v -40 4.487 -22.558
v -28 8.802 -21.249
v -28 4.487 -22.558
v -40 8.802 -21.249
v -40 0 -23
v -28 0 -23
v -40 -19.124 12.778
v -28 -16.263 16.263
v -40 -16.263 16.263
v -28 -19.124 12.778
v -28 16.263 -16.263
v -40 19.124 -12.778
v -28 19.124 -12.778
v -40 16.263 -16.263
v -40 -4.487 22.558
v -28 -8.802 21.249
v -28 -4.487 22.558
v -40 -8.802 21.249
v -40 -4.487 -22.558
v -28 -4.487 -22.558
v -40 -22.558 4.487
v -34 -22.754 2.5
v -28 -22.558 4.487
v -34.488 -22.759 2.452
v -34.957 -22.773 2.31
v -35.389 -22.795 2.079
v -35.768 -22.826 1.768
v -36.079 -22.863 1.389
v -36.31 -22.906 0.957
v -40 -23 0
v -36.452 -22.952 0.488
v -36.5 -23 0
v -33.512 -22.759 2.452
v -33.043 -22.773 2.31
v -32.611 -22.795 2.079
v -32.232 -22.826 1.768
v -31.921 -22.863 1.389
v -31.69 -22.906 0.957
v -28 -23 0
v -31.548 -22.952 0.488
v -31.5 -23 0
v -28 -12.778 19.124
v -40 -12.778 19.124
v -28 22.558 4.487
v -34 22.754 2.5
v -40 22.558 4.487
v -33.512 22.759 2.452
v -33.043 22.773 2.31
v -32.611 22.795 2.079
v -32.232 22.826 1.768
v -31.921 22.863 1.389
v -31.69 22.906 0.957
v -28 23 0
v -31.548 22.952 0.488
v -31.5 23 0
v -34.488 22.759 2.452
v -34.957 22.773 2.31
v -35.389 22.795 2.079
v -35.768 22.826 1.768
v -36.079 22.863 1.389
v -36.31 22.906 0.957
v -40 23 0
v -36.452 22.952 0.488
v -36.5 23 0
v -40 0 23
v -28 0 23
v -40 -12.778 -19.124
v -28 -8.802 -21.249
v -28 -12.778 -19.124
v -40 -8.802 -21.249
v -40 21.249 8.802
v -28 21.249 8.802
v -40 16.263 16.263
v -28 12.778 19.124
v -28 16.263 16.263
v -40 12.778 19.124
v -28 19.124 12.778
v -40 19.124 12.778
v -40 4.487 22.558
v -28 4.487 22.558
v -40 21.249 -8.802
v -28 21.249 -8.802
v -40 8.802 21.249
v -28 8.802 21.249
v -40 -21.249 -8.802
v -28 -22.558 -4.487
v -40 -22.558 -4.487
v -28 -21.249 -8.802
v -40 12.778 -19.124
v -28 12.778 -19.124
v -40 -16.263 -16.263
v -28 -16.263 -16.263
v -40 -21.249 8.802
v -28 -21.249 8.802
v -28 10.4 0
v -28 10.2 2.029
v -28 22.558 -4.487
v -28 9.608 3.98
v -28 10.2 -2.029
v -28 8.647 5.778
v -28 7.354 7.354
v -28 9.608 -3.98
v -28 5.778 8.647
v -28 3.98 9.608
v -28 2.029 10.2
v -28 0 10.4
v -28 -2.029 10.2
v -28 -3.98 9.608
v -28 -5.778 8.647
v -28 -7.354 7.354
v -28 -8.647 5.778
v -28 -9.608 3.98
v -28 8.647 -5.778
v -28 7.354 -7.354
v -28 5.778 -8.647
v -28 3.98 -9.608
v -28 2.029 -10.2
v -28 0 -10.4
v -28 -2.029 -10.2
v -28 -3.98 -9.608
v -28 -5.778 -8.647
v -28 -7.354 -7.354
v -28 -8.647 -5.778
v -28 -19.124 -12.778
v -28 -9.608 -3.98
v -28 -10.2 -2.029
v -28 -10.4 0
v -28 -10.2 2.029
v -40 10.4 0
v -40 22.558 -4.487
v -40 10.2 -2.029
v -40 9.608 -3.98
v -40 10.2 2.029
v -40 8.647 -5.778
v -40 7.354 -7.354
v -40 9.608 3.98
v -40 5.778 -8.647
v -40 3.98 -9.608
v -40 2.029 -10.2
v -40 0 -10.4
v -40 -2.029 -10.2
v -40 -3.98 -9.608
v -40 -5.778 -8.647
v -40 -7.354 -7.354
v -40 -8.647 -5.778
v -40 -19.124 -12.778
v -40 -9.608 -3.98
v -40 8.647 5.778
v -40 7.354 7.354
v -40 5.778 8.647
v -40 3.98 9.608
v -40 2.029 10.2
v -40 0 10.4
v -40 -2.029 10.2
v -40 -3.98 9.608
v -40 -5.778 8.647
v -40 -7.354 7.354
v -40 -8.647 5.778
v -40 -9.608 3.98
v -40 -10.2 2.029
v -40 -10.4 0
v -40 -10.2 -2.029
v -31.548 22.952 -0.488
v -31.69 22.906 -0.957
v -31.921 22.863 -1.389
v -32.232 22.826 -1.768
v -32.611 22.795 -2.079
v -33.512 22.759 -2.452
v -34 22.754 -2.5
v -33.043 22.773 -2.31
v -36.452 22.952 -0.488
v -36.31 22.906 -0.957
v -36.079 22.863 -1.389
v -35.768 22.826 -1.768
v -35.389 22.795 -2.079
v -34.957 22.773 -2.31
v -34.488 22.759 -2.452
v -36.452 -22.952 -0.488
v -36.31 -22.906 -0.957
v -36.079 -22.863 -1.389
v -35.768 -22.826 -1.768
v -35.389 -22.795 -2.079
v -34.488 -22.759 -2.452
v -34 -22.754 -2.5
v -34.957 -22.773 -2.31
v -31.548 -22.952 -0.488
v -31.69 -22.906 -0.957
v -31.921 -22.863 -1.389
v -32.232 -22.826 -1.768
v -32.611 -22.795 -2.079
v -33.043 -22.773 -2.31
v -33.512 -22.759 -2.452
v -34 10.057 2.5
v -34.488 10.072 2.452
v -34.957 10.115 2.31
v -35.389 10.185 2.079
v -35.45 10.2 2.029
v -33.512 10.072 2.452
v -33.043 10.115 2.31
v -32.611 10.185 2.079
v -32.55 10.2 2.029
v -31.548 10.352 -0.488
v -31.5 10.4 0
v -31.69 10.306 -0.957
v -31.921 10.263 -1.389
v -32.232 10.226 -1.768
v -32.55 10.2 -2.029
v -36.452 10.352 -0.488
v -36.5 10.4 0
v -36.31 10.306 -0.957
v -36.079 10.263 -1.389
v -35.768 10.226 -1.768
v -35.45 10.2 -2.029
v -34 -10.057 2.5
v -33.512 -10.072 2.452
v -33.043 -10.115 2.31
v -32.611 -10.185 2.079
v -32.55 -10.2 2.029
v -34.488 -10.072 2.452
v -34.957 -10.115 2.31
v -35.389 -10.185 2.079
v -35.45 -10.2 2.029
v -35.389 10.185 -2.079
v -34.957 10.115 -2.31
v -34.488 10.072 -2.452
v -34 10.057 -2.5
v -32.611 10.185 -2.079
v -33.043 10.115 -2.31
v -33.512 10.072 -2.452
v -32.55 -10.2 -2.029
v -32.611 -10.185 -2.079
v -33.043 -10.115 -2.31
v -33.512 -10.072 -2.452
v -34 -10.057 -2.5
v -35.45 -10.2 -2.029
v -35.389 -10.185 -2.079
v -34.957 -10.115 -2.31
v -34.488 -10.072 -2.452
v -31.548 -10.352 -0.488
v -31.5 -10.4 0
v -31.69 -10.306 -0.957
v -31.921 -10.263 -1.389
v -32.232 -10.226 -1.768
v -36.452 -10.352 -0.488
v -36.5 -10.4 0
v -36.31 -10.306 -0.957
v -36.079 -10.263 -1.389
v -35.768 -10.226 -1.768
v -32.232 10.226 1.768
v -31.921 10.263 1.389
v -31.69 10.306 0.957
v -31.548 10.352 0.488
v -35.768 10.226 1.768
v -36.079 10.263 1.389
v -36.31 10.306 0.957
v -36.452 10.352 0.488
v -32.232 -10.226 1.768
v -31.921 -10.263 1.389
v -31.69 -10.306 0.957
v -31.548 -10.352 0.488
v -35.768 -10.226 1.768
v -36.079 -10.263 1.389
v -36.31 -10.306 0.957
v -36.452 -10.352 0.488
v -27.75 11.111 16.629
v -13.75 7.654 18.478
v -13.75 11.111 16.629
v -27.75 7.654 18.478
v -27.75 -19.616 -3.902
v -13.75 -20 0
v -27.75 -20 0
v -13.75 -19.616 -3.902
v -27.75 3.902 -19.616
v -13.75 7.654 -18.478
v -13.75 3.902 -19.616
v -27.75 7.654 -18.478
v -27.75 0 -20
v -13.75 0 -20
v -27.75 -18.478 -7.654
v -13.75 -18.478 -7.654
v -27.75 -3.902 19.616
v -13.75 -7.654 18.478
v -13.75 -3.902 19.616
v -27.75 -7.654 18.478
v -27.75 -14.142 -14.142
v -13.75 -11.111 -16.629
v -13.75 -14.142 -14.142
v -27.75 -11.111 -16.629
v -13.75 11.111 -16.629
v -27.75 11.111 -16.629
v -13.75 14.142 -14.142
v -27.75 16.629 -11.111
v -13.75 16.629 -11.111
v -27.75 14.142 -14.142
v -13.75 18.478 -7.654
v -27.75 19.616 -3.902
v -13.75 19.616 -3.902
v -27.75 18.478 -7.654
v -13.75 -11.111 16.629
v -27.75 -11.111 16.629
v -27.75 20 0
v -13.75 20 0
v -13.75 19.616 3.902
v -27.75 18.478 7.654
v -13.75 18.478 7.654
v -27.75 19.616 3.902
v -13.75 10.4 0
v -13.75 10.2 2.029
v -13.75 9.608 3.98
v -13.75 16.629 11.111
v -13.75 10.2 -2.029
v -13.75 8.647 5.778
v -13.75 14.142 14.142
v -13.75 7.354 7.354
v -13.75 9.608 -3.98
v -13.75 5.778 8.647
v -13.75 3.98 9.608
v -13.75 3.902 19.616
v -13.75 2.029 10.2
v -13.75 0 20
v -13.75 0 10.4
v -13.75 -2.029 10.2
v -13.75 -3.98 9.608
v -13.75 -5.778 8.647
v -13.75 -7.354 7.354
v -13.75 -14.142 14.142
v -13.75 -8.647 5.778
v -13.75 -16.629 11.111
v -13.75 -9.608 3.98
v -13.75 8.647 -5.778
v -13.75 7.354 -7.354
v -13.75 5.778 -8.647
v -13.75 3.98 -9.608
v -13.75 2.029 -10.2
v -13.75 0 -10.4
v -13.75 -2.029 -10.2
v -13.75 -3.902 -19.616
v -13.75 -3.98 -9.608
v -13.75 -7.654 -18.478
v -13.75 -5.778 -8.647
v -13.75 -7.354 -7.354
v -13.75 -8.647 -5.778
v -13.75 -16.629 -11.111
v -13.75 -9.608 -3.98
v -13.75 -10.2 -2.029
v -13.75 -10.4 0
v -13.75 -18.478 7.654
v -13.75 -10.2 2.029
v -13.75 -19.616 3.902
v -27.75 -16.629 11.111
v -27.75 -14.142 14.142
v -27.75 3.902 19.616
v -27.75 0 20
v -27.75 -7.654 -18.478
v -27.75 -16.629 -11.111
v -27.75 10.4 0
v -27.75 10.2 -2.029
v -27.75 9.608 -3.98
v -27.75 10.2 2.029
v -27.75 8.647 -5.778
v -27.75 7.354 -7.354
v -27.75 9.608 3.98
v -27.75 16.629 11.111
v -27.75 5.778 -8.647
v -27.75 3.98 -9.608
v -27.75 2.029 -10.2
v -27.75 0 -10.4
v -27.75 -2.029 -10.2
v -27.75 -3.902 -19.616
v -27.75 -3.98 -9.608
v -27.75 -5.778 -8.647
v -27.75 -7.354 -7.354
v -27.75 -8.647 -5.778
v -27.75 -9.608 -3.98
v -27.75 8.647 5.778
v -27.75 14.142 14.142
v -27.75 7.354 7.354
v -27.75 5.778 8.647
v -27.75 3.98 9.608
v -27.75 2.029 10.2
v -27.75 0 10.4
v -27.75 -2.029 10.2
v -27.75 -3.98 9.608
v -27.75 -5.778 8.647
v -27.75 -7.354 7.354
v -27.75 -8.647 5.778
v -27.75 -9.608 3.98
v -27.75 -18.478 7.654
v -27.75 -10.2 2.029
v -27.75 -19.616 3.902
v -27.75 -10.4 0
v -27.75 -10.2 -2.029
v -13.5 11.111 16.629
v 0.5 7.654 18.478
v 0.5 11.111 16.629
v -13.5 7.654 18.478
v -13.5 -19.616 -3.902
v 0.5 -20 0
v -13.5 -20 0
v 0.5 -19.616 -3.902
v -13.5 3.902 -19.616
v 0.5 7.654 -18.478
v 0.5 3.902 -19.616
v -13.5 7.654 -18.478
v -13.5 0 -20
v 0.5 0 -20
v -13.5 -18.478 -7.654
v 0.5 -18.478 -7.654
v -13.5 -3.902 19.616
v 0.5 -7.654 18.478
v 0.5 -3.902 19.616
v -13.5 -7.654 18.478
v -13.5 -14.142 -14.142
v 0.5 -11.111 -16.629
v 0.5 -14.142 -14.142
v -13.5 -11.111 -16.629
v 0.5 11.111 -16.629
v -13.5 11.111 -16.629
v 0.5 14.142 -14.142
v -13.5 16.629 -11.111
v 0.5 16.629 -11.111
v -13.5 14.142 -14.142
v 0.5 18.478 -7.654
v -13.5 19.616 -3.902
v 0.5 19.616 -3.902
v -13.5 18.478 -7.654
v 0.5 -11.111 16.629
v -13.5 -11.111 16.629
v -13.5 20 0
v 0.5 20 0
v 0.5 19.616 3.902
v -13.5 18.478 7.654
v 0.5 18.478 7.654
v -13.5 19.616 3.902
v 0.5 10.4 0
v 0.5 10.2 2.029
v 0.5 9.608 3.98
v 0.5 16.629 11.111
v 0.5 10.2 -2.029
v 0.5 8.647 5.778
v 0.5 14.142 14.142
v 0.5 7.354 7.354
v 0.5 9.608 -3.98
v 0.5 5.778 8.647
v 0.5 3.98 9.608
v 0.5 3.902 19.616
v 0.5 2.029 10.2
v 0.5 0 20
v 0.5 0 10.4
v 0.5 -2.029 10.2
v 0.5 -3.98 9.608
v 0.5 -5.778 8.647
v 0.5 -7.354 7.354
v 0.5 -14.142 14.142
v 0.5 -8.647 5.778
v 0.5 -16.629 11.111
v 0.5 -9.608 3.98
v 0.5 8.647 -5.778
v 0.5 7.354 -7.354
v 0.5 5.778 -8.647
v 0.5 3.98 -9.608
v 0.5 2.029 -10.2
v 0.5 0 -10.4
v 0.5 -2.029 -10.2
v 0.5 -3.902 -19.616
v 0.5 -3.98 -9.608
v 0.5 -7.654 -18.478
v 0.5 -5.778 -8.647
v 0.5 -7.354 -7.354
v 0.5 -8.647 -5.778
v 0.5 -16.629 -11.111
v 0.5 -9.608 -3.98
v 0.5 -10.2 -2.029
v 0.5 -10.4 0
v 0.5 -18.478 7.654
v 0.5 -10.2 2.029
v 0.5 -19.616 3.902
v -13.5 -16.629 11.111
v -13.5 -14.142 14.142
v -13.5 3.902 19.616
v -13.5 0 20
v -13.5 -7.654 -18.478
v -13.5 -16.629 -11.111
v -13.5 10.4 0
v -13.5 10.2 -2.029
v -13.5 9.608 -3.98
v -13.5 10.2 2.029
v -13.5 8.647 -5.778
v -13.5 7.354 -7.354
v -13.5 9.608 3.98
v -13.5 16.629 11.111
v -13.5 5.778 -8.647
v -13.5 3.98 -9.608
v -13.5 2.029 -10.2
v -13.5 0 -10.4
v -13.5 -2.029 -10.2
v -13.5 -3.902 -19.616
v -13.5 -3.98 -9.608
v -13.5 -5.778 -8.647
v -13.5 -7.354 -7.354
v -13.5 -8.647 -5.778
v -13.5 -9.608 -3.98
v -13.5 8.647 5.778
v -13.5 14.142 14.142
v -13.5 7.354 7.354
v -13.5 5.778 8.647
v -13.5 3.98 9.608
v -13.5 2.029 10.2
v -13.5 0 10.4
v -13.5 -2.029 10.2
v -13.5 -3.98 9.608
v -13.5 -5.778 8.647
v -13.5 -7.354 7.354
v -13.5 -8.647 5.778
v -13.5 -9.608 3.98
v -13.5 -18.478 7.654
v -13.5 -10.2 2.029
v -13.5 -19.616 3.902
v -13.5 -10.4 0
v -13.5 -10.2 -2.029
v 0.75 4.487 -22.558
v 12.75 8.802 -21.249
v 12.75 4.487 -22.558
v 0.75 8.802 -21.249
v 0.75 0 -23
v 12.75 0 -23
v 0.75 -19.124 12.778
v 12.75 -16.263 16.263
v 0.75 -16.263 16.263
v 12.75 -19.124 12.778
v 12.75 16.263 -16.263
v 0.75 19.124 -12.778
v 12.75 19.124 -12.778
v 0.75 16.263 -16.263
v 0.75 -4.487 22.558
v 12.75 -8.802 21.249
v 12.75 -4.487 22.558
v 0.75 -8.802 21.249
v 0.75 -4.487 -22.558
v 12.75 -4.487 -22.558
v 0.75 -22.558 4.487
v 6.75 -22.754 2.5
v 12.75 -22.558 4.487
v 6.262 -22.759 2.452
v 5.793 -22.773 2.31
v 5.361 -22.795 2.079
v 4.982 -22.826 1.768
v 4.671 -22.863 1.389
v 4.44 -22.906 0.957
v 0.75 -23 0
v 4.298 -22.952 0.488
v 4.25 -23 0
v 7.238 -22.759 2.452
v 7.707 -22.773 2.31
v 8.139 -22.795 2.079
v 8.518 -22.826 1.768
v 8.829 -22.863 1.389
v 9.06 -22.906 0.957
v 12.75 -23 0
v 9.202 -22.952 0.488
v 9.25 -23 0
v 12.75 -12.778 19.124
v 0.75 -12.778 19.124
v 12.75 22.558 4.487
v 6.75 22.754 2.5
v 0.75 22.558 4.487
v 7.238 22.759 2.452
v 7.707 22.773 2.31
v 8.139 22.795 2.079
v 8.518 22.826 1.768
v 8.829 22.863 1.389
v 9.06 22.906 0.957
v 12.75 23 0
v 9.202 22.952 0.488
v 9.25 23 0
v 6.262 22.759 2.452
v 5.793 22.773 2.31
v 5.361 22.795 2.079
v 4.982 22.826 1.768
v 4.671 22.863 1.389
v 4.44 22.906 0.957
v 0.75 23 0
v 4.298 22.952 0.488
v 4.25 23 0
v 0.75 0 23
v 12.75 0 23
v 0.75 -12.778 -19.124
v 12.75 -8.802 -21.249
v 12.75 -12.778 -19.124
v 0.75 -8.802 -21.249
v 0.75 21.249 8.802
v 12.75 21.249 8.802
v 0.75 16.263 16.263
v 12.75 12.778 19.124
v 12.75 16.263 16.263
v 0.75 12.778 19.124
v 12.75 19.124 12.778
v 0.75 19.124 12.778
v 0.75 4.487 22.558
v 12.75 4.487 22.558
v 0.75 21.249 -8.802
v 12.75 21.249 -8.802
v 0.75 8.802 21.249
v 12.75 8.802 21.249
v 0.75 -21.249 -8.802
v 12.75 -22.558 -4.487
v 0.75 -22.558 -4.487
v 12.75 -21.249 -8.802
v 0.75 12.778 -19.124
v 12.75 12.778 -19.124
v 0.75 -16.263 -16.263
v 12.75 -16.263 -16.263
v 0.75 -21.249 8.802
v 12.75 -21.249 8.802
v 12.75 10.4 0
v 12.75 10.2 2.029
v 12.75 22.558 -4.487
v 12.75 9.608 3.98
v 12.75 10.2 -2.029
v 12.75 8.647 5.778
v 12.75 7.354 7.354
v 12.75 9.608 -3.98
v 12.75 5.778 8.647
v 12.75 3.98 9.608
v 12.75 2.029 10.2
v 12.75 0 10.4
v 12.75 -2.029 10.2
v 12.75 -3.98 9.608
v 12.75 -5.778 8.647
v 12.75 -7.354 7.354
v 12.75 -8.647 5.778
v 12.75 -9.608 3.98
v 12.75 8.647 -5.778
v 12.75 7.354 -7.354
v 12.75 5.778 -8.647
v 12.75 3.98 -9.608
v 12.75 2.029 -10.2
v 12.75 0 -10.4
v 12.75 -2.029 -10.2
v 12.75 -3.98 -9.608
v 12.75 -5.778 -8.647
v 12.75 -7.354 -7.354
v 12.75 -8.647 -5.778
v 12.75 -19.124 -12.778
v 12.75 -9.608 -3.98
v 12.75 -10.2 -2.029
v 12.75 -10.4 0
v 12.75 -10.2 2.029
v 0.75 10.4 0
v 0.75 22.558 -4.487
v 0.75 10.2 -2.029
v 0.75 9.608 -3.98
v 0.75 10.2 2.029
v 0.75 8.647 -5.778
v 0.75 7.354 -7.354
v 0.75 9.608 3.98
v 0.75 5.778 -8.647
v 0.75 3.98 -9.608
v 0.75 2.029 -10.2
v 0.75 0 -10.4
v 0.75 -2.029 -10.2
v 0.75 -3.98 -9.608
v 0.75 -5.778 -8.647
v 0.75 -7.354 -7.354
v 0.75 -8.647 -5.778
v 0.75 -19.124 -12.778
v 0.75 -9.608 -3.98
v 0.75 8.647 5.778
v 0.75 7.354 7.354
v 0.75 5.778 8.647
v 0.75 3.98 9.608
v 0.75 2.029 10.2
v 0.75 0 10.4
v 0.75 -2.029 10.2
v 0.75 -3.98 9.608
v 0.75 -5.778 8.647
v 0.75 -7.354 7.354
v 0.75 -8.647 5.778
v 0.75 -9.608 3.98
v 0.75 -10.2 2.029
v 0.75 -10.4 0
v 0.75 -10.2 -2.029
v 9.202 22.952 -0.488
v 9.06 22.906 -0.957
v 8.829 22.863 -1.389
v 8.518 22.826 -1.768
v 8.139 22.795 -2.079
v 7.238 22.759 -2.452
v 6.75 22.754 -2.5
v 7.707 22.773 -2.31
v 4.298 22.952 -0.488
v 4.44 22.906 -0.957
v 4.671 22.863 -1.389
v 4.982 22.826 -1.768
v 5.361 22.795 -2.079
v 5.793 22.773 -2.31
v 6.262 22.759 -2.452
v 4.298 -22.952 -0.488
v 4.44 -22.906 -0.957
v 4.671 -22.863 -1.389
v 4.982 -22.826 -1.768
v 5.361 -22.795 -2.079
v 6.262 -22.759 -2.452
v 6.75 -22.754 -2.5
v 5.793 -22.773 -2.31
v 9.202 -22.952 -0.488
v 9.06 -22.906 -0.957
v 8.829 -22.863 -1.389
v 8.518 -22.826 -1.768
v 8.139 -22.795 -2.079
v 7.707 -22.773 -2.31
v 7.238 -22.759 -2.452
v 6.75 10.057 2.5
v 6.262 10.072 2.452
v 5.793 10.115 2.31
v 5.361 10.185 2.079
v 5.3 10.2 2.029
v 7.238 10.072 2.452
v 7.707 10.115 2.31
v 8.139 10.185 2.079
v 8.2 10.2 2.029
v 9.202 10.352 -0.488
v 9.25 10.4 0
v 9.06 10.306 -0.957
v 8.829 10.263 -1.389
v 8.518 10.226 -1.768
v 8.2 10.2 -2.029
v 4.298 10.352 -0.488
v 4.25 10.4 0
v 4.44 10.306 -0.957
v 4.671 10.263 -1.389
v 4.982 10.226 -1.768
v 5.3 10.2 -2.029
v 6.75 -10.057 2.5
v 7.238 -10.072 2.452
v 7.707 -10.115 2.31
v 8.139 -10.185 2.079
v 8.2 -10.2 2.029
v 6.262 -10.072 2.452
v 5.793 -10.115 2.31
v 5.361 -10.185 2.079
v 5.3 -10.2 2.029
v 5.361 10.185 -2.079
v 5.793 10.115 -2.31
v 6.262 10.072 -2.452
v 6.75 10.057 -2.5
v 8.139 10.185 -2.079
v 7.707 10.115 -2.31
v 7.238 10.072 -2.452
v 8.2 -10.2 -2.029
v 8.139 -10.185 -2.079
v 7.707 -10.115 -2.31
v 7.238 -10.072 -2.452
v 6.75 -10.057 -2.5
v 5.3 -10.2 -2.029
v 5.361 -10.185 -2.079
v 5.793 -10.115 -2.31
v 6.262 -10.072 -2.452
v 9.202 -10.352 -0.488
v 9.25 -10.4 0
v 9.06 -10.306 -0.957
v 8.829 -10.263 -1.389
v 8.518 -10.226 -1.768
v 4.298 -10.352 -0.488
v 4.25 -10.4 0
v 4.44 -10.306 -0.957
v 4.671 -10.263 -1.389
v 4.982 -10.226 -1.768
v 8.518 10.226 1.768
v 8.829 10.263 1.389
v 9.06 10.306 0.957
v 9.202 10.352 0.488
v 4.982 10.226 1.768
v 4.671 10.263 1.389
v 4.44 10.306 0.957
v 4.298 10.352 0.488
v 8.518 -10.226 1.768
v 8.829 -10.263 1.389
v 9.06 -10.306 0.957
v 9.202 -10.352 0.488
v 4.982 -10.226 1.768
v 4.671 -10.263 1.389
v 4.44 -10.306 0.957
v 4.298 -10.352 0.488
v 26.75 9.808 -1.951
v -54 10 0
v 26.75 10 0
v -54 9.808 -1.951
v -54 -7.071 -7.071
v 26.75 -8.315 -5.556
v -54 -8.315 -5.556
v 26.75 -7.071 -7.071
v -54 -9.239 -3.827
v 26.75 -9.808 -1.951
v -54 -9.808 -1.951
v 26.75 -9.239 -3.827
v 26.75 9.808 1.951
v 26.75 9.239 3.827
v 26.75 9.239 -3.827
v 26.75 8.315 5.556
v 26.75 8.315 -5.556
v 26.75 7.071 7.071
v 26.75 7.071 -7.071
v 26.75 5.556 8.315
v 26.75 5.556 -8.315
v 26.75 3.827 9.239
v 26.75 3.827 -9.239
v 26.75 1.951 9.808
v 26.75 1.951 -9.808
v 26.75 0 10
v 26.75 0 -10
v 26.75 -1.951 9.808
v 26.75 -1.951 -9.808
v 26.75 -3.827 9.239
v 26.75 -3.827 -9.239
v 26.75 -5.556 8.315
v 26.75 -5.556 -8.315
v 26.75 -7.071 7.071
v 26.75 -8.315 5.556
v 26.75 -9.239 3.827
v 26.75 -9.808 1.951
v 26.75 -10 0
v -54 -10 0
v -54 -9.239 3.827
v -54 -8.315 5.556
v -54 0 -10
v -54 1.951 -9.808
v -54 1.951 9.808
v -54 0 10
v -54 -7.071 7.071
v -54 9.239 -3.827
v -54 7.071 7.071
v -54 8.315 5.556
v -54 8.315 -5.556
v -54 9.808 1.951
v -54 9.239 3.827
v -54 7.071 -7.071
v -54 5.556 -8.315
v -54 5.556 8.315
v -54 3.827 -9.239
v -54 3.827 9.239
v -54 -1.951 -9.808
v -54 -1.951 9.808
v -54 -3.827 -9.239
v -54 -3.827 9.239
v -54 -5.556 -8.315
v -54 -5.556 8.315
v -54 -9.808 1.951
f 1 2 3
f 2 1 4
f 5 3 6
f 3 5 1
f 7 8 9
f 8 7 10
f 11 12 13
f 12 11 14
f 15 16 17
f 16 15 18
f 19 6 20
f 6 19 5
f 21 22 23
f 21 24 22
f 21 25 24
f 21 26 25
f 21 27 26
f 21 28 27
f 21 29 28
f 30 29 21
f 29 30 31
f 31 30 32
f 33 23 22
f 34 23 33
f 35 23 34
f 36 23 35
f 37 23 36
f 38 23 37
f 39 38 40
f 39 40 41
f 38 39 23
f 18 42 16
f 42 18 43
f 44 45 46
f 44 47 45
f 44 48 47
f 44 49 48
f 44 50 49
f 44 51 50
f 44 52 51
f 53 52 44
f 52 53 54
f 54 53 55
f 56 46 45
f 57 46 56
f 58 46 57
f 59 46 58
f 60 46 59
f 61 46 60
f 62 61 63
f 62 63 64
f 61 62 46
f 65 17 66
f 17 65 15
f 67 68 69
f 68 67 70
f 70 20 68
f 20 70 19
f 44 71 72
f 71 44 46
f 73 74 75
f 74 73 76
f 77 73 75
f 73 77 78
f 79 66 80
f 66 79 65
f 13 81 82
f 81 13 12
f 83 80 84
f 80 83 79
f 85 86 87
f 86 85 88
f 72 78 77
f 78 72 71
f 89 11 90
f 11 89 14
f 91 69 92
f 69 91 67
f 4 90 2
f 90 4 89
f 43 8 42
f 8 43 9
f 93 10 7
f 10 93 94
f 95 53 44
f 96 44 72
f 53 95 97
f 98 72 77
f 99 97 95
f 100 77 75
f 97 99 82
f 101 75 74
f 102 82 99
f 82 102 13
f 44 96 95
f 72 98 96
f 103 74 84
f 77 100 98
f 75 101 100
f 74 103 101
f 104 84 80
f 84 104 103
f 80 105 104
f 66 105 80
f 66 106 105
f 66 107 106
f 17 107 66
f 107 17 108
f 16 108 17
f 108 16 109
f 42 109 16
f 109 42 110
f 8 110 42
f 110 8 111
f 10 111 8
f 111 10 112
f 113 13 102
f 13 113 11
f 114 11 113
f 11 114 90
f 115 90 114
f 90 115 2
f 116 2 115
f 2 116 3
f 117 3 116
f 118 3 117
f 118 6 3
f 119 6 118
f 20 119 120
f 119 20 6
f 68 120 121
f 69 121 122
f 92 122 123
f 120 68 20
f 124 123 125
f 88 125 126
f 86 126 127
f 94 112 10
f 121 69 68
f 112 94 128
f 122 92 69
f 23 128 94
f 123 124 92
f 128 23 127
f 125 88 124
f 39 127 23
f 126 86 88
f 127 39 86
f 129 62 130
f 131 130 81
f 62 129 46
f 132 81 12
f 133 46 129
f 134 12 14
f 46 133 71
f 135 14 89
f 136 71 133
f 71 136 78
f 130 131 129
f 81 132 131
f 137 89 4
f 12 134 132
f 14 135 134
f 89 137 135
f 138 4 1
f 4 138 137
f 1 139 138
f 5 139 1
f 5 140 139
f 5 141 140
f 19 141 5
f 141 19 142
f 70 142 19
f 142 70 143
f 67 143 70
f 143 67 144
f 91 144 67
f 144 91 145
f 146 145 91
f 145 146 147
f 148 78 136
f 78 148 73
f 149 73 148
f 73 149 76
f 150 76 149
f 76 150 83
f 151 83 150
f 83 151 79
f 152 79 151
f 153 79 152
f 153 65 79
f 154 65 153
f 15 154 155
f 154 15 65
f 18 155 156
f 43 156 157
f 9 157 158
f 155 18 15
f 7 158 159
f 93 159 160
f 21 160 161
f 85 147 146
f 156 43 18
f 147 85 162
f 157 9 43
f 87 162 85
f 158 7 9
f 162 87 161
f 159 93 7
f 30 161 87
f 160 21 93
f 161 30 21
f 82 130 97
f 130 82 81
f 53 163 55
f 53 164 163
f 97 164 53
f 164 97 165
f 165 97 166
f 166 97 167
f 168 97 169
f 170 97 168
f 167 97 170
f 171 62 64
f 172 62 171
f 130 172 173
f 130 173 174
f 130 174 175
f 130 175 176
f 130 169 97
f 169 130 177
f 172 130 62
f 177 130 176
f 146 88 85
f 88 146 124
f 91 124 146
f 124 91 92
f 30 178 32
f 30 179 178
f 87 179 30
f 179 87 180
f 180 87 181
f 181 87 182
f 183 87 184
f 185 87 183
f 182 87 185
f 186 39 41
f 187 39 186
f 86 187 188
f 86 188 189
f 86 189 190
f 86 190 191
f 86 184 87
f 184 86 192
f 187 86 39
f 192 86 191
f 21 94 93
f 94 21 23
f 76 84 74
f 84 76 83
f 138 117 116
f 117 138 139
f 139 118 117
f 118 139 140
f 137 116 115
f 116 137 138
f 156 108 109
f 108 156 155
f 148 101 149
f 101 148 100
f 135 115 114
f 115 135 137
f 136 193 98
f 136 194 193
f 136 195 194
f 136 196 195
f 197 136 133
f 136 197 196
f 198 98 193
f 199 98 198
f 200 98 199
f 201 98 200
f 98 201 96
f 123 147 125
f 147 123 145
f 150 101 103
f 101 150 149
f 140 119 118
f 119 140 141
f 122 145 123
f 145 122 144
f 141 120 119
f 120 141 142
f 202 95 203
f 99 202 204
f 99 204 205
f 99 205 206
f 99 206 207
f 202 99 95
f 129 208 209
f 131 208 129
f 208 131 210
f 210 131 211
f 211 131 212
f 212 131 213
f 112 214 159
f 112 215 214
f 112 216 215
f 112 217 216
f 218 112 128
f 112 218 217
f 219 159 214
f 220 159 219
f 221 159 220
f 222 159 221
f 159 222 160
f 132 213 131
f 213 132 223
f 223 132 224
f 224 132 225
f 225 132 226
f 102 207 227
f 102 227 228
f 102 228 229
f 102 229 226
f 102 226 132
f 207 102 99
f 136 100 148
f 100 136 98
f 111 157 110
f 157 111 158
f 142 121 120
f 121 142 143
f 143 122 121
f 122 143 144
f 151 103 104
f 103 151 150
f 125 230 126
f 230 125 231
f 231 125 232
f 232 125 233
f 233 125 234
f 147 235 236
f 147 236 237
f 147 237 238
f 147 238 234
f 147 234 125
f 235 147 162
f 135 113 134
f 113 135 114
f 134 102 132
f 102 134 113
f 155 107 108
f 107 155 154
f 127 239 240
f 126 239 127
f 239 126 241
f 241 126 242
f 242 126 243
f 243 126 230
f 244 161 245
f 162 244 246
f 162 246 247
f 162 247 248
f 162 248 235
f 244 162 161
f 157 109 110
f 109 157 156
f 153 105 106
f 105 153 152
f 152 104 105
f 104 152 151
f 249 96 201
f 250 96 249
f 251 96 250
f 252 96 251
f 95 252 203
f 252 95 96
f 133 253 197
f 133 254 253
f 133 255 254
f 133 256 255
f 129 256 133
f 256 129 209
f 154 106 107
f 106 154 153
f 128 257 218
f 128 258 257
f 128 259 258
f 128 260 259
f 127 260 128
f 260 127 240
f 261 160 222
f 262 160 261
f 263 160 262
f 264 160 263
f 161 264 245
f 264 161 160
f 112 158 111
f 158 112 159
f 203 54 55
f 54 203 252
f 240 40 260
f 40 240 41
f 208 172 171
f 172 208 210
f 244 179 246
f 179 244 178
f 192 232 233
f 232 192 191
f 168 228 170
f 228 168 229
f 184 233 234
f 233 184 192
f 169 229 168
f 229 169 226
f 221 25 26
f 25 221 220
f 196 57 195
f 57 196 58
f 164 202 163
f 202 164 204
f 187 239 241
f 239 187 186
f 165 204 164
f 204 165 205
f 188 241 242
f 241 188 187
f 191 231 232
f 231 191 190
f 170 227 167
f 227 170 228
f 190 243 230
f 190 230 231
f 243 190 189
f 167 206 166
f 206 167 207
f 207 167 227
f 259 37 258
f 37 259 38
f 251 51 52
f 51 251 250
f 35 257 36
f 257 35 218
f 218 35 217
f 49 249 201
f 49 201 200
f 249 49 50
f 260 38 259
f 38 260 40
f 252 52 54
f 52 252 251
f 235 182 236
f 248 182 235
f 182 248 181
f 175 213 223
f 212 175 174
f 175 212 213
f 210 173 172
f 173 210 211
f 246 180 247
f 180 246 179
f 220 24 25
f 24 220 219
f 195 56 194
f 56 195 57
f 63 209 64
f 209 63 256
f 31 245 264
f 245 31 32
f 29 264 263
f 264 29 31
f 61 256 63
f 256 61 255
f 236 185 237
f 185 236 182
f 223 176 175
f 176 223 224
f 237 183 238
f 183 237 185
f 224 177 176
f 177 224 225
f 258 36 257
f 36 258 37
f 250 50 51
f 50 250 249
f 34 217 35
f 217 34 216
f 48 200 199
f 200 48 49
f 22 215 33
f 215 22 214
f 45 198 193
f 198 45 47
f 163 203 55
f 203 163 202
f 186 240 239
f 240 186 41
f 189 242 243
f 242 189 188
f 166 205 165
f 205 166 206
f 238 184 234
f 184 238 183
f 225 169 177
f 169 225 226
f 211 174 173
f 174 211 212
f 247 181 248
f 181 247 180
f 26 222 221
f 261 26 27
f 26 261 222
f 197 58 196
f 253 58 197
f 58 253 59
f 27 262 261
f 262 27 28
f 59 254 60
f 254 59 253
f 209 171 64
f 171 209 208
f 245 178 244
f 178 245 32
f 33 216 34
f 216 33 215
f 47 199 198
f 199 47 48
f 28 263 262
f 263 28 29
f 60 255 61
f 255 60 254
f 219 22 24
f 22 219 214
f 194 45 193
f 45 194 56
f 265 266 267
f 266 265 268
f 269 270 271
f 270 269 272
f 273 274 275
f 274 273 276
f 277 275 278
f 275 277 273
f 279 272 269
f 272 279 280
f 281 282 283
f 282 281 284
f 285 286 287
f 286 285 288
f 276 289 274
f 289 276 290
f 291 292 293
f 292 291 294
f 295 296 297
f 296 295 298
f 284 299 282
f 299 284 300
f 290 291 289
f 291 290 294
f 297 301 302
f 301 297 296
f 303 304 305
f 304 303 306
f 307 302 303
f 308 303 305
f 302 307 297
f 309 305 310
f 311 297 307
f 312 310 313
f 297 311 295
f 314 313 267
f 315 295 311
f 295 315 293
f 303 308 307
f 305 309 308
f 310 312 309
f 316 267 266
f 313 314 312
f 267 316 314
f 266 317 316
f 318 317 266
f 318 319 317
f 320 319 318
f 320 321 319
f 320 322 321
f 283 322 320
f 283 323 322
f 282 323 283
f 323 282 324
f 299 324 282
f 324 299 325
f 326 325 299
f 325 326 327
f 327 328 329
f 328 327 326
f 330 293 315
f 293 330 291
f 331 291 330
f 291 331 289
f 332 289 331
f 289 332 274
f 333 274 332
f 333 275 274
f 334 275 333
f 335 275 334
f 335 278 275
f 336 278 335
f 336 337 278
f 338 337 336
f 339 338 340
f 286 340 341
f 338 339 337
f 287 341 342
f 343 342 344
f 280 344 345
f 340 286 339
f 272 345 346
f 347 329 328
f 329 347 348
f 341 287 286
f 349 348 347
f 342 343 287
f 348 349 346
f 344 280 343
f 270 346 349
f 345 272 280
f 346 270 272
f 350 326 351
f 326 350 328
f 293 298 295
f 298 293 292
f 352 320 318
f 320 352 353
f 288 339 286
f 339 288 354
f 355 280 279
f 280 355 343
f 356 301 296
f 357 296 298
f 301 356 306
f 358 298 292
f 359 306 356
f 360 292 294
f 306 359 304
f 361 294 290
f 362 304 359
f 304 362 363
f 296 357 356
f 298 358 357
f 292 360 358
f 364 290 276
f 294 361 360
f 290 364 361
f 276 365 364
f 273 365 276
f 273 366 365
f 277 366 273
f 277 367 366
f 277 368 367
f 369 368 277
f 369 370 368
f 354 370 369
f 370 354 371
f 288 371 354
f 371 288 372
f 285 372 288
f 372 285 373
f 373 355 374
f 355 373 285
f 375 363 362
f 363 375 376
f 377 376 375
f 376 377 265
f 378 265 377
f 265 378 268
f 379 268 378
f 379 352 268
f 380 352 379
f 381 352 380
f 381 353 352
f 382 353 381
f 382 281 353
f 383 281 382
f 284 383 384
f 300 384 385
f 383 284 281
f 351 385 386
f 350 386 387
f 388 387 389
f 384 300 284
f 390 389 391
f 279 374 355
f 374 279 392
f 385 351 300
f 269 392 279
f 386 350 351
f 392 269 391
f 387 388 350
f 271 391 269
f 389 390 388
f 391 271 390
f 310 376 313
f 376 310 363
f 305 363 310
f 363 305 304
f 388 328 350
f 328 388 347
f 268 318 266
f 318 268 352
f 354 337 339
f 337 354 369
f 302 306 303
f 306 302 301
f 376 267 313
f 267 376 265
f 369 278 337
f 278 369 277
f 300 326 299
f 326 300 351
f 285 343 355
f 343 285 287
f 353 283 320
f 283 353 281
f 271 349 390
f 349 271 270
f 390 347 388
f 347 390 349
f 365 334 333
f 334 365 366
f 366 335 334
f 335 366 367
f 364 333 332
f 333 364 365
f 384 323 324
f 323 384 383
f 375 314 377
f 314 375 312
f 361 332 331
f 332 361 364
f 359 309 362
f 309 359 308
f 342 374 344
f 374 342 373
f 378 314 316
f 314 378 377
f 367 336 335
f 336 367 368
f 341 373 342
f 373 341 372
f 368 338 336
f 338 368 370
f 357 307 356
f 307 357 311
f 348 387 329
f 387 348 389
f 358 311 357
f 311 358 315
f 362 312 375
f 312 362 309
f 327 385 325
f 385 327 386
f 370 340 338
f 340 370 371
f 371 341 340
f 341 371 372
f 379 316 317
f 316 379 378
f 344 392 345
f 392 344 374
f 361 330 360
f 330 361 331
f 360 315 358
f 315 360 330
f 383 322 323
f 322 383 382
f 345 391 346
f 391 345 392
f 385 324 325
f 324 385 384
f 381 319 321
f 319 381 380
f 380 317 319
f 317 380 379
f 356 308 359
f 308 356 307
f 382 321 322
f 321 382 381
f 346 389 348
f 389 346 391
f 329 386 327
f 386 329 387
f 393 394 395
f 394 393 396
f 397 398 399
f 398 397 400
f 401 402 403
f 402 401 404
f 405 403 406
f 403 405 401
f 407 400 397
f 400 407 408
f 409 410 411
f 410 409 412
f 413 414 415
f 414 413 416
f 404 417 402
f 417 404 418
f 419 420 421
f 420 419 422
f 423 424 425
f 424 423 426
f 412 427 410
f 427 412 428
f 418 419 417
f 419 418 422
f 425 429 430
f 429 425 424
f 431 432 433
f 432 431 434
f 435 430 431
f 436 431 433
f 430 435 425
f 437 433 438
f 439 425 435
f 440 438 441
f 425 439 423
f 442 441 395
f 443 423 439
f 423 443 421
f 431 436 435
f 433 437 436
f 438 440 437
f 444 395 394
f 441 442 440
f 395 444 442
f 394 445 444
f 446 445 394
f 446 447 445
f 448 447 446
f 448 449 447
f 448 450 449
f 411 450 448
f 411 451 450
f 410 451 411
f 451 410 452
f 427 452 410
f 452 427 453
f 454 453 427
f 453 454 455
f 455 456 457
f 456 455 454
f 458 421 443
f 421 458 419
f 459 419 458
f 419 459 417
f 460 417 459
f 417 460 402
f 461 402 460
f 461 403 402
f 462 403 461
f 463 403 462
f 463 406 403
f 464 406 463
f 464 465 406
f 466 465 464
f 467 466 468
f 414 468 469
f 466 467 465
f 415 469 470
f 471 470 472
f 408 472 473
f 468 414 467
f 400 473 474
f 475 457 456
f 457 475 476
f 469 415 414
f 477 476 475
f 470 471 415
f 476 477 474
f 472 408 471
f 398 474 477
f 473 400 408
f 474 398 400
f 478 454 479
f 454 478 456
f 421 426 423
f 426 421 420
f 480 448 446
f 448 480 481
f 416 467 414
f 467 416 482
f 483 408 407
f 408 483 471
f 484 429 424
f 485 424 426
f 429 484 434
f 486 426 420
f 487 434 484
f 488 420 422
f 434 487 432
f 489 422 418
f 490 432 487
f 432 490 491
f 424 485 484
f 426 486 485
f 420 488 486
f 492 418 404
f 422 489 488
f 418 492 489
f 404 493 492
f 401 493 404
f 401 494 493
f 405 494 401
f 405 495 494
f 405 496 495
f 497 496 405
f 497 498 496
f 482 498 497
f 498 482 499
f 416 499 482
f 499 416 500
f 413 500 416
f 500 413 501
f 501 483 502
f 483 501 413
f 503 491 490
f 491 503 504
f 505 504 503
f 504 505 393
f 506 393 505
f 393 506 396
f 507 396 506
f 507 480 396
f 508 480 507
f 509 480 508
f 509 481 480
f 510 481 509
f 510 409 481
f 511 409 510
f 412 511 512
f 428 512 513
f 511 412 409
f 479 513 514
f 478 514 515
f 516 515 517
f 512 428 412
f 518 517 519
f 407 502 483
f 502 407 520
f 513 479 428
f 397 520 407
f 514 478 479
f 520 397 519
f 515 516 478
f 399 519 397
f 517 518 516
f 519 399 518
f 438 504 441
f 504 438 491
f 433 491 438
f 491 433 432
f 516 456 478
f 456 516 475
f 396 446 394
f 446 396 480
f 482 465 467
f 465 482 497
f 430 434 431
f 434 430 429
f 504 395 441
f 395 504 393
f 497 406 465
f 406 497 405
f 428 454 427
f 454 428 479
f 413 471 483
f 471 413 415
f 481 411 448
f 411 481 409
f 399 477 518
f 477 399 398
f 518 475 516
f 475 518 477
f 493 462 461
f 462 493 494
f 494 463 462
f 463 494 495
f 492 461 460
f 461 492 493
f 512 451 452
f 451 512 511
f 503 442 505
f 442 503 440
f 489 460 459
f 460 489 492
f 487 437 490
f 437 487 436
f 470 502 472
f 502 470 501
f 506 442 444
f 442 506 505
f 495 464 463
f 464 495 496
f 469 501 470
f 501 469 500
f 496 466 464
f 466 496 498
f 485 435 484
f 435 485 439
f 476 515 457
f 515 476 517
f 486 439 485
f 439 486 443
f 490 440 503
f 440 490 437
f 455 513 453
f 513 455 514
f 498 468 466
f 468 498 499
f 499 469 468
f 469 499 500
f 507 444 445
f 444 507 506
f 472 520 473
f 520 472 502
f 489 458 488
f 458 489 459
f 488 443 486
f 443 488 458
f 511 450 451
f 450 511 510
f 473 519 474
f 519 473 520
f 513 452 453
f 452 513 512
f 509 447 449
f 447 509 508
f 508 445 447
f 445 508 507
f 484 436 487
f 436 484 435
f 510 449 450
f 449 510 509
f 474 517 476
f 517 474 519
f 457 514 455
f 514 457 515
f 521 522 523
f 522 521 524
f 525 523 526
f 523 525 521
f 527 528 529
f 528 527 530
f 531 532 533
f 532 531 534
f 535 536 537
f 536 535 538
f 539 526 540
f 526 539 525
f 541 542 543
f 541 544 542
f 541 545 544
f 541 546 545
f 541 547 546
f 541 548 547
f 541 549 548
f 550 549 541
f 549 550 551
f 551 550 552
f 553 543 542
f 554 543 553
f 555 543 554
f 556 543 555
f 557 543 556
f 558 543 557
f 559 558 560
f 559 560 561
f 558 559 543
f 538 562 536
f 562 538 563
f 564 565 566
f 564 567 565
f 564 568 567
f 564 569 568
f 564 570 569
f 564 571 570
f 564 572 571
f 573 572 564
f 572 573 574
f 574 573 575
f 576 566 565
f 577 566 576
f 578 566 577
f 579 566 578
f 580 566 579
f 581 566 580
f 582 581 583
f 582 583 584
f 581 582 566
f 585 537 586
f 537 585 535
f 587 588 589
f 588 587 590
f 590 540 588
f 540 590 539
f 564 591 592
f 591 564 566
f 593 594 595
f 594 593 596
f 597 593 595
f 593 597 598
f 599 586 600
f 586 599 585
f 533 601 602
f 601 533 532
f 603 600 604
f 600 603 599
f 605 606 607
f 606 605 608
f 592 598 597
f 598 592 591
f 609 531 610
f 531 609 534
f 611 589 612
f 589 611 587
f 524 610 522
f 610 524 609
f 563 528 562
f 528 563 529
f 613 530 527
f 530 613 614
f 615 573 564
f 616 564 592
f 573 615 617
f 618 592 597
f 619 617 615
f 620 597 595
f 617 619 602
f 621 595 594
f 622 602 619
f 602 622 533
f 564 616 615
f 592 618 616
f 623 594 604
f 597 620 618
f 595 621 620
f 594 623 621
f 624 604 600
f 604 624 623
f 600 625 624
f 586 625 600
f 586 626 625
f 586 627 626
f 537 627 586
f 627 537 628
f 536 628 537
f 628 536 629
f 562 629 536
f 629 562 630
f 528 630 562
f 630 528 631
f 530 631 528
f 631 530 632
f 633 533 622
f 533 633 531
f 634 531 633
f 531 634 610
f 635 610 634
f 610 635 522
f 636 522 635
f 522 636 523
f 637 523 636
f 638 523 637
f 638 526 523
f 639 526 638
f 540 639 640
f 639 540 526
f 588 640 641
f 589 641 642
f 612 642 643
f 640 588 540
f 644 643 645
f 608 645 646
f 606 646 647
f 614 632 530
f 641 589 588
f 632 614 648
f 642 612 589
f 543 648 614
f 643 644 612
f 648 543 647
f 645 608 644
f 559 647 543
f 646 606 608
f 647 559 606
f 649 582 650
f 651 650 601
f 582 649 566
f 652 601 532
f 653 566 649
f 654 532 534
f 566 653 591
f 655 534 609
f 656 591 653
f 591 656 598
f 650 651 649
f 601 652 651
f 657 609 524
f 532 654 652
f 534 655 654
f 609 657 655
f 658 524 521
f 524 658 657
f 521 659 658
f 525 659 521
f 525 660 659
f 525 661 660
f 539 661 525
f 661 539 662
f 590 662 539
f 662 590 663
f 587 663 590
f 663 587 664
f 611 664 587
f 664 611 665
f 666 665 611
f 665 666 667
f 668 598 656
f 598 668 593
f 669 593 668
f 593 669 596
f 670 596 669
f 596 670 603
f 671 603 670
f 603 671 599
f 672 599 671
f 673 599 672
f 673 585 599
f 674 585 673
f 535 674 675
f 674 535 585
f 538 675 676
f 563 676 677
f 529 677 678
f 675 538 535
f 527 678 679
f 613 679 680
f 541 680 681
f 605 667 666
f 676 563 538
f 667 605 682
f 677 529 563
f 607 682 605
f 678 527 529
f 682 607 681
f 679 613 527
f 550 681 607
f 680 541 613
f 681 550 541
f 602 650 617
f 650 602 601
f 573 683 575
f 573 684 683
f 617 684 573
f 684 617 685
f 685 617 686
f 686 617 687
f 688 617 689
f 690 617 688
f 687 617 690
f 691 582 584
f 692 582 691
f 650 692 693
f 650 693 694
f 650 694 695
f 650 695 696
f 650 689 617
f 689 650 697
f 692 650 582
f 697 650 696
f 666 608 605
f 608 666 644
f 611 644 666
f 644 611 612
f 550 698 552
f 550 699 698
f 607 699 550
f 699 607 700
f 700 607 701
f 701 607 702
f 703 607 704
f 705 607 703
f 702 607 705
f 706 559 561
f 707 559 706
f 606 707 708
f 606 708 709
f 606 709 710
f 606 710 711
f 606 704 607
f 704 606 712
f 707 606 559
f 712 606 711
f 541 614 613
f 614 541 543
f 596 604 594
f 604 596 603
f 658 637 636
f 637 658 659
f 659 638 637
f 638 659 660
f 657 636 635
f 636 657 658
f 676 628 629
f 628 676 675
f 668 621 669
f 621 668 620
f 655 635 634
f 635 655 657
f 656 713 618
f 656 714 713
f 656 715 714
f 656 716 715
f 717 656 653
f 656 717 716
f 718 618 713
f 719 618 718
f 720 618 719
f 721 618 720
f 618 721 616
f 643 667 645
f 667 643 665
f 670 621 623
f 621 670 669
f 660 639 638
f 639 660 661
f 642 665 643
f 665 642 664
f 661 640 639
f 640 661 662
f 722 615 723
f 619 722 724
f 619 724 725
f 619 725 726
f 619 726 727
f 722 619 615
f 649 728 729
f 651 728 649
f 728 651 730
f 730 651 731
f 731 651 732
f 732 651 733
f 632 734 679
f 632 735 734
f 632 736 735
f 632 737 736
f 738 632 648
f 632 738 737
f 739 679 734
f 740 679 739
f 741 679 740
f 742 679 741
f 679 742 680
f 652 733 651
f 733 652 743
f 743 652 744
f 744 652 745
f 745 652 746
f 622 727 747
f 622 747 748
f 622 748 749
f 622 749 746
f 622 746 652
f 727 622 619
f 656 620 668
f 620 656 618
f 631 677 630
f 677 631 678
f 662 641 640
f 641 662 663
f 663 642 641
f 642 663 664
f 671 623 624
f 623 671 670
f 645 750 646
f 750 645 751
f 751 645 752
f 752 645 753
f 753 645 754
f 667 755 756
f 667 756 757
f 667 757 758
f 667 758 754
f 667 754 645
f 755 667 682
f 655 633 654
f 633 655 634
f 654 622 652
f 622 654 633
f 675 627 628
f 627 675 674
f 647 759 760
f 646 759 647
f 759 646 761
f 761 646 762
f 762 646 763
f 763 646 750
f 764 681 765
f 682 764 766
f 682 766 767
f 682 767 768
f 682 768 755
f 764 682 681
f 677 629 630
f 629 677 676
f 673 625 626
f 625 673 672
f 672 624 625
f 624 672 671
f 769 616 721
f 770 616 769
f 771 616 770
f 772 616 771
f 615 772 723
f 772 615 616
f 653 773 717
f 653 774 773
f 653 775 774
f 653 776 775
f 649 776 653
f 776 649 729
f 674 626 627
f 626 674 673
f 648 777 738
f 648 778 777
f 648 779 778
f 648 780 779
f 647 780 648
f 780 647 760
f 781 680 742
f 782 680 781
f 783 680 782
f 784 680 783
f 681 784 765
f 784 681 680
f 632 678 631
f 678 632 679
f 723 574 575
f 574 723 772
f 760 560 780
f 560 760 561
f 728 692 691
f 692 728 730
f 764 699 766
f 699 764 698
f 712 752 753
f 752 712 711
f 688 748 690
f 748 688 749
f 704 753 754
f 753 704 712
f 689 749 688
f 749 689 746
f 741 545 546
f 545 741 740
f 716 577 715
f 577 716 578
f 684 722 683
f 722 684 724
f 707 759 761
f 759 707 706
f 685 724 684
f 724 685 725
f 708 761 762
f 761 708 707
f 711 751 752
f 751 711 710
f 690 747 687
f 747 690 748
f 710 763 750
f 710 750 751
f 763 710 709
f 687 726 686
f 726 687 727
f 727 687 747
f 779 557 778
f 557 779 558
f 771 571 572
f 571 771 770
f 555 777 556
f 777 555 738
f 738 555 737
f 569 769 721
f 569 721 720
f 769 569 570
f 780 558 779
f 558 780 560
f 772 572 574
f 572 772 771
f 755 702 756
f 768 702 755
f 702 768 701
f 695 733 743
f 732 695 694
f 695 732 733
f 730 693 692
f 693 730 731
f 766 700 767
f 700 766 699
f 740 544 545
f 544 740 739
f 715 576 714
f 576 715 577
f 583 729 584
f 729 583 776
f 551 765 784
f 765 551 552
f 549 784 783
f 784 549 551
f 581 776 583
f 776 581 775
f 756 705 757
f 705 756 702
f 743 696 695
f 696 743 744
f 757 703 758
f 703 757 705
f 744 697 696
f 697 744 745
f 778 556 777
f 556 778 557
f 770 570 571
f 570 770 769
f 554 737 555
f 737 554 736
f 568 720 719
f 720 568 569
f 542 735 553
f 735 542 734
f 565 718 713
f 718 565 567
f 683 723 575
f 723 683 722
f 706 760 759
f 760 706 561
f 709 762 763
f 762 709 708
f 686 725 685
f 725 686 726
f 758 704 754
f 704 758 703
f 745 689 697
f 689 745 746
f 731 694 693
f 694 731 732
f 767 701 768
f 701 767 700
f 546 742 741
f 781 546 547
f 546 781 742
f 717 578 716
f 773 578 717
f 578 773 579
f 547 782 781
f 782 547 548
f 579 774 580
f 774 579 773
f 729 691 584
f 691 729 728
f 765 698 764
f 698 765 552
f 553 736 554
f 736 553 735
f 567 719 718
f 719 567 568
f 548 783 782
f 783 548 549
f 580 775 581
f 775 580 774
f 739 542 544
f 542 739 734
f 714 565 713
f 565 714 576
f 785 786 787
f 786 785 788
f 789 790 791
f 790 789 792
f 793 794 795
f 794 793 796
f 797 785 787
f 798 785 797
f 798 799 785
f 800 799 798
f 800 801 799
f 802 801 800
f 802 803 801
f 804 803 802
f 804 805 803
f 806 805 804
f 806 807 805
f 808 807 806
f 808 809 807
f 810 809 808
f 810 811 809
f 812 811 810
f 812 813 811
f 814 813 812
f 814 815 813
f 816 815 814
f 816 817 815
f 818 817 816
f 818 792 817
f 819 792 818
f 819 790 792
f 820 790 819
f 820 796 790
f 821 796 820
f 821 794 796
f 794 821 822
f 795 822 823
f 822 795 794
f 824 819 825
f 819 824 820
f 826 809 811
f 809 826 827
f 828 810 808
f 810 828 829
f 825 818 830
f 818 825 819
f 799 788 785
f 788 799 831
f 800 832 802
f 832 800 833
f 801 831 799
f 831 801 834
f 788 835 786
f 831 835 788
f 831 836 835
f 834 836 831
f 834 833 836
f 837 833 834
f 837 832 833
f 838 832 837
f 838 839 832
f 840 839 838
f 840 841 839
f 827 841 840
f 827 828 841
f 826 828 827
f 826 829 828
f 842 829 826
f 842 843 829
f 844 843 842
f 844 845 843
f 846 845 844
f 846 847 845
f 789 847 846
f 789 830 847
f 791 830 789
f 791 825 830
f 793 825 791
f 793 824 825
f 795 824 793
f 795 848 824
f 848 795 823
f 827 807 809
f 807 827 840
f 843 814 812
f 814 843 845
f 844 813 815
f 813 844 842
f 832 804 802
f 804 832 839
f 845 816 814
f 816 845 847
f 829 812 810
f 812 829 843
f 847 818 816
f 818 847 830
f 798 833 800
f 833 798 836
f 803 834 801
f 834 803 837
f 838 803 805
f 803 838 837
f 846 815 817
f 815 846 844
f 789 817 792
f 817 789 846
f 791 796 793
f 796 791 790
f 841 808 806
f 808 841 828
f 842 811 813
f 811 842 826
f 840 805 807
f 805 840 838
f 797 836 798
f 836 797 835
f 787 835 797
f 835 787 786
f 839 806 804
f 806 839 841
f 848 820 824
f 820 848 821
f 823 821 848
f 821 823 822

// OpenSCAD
$fn = 32;

// ------------------------------------------------------------------------
// Shaft with rings and collars: d20 shaft, 4 rings
// Every part is its own module, assembly() places them once.
// ------------------------------------------------------------------------

// --- part 1 ---
module shaft() {
  translate([0, 0, -40.375]) cylinder(h = 80.75, d = 20);
}

// --- part 2 ---
module collar_a() {
  difference() {
    cylinder(h = 12, d = 46);
    translate([0, 0, -1]) cylinder(h = 14, d = 20.8);
    translate([0, 0, 6]) rotate([90, 0, 0]) cylinder(h = 48, d = 5, center = true);
  }
}

// --- part 3 ---
module spacer_a() {
  difference() {
      translate([0, 0, 0]) cylinder(h = 14, d = 40);
      translate([0, 0, -1]) cylinder(h = 16, d = 20.8);
    }
}

// --- part 4 ---
module spacer_b() {
  difference() {
      translate([0, 0, 0]) cylinder(h = 14, d = 40);
      translate([0, 0, -1]) cylinder(h = 16, d = 20.8);
    }
}

// --- part 5 ---
module collar_b() {
  difference() {
    cylinder(h = 12, d = 46);
    translate([0, 0, -1]) cylinder(h = 14, d = 20.8);
    translate([0, 0, 6]) rotate([90, 0, 0]) cylinder(h = 48, d = 5, center = true);
  }
}

// --- assembly ---
module assembly() {
  translate([-13.625, 0, 0]) rotate([0, 90, 0]) shaft();
  translate([-40, 0, 0]) rotate([0, 90, 0]) collar_a();
  translate([-27.75, 0, 0]) rotate([0, 90, 0]) spacer_a();
  translate([-13.5, 0, 0]) rotate([0, 90, 0]) spacer_b();
  translate([0.75, 0, 0]) rotate([0, 90, 0]) collar_b();
}

assembly();
